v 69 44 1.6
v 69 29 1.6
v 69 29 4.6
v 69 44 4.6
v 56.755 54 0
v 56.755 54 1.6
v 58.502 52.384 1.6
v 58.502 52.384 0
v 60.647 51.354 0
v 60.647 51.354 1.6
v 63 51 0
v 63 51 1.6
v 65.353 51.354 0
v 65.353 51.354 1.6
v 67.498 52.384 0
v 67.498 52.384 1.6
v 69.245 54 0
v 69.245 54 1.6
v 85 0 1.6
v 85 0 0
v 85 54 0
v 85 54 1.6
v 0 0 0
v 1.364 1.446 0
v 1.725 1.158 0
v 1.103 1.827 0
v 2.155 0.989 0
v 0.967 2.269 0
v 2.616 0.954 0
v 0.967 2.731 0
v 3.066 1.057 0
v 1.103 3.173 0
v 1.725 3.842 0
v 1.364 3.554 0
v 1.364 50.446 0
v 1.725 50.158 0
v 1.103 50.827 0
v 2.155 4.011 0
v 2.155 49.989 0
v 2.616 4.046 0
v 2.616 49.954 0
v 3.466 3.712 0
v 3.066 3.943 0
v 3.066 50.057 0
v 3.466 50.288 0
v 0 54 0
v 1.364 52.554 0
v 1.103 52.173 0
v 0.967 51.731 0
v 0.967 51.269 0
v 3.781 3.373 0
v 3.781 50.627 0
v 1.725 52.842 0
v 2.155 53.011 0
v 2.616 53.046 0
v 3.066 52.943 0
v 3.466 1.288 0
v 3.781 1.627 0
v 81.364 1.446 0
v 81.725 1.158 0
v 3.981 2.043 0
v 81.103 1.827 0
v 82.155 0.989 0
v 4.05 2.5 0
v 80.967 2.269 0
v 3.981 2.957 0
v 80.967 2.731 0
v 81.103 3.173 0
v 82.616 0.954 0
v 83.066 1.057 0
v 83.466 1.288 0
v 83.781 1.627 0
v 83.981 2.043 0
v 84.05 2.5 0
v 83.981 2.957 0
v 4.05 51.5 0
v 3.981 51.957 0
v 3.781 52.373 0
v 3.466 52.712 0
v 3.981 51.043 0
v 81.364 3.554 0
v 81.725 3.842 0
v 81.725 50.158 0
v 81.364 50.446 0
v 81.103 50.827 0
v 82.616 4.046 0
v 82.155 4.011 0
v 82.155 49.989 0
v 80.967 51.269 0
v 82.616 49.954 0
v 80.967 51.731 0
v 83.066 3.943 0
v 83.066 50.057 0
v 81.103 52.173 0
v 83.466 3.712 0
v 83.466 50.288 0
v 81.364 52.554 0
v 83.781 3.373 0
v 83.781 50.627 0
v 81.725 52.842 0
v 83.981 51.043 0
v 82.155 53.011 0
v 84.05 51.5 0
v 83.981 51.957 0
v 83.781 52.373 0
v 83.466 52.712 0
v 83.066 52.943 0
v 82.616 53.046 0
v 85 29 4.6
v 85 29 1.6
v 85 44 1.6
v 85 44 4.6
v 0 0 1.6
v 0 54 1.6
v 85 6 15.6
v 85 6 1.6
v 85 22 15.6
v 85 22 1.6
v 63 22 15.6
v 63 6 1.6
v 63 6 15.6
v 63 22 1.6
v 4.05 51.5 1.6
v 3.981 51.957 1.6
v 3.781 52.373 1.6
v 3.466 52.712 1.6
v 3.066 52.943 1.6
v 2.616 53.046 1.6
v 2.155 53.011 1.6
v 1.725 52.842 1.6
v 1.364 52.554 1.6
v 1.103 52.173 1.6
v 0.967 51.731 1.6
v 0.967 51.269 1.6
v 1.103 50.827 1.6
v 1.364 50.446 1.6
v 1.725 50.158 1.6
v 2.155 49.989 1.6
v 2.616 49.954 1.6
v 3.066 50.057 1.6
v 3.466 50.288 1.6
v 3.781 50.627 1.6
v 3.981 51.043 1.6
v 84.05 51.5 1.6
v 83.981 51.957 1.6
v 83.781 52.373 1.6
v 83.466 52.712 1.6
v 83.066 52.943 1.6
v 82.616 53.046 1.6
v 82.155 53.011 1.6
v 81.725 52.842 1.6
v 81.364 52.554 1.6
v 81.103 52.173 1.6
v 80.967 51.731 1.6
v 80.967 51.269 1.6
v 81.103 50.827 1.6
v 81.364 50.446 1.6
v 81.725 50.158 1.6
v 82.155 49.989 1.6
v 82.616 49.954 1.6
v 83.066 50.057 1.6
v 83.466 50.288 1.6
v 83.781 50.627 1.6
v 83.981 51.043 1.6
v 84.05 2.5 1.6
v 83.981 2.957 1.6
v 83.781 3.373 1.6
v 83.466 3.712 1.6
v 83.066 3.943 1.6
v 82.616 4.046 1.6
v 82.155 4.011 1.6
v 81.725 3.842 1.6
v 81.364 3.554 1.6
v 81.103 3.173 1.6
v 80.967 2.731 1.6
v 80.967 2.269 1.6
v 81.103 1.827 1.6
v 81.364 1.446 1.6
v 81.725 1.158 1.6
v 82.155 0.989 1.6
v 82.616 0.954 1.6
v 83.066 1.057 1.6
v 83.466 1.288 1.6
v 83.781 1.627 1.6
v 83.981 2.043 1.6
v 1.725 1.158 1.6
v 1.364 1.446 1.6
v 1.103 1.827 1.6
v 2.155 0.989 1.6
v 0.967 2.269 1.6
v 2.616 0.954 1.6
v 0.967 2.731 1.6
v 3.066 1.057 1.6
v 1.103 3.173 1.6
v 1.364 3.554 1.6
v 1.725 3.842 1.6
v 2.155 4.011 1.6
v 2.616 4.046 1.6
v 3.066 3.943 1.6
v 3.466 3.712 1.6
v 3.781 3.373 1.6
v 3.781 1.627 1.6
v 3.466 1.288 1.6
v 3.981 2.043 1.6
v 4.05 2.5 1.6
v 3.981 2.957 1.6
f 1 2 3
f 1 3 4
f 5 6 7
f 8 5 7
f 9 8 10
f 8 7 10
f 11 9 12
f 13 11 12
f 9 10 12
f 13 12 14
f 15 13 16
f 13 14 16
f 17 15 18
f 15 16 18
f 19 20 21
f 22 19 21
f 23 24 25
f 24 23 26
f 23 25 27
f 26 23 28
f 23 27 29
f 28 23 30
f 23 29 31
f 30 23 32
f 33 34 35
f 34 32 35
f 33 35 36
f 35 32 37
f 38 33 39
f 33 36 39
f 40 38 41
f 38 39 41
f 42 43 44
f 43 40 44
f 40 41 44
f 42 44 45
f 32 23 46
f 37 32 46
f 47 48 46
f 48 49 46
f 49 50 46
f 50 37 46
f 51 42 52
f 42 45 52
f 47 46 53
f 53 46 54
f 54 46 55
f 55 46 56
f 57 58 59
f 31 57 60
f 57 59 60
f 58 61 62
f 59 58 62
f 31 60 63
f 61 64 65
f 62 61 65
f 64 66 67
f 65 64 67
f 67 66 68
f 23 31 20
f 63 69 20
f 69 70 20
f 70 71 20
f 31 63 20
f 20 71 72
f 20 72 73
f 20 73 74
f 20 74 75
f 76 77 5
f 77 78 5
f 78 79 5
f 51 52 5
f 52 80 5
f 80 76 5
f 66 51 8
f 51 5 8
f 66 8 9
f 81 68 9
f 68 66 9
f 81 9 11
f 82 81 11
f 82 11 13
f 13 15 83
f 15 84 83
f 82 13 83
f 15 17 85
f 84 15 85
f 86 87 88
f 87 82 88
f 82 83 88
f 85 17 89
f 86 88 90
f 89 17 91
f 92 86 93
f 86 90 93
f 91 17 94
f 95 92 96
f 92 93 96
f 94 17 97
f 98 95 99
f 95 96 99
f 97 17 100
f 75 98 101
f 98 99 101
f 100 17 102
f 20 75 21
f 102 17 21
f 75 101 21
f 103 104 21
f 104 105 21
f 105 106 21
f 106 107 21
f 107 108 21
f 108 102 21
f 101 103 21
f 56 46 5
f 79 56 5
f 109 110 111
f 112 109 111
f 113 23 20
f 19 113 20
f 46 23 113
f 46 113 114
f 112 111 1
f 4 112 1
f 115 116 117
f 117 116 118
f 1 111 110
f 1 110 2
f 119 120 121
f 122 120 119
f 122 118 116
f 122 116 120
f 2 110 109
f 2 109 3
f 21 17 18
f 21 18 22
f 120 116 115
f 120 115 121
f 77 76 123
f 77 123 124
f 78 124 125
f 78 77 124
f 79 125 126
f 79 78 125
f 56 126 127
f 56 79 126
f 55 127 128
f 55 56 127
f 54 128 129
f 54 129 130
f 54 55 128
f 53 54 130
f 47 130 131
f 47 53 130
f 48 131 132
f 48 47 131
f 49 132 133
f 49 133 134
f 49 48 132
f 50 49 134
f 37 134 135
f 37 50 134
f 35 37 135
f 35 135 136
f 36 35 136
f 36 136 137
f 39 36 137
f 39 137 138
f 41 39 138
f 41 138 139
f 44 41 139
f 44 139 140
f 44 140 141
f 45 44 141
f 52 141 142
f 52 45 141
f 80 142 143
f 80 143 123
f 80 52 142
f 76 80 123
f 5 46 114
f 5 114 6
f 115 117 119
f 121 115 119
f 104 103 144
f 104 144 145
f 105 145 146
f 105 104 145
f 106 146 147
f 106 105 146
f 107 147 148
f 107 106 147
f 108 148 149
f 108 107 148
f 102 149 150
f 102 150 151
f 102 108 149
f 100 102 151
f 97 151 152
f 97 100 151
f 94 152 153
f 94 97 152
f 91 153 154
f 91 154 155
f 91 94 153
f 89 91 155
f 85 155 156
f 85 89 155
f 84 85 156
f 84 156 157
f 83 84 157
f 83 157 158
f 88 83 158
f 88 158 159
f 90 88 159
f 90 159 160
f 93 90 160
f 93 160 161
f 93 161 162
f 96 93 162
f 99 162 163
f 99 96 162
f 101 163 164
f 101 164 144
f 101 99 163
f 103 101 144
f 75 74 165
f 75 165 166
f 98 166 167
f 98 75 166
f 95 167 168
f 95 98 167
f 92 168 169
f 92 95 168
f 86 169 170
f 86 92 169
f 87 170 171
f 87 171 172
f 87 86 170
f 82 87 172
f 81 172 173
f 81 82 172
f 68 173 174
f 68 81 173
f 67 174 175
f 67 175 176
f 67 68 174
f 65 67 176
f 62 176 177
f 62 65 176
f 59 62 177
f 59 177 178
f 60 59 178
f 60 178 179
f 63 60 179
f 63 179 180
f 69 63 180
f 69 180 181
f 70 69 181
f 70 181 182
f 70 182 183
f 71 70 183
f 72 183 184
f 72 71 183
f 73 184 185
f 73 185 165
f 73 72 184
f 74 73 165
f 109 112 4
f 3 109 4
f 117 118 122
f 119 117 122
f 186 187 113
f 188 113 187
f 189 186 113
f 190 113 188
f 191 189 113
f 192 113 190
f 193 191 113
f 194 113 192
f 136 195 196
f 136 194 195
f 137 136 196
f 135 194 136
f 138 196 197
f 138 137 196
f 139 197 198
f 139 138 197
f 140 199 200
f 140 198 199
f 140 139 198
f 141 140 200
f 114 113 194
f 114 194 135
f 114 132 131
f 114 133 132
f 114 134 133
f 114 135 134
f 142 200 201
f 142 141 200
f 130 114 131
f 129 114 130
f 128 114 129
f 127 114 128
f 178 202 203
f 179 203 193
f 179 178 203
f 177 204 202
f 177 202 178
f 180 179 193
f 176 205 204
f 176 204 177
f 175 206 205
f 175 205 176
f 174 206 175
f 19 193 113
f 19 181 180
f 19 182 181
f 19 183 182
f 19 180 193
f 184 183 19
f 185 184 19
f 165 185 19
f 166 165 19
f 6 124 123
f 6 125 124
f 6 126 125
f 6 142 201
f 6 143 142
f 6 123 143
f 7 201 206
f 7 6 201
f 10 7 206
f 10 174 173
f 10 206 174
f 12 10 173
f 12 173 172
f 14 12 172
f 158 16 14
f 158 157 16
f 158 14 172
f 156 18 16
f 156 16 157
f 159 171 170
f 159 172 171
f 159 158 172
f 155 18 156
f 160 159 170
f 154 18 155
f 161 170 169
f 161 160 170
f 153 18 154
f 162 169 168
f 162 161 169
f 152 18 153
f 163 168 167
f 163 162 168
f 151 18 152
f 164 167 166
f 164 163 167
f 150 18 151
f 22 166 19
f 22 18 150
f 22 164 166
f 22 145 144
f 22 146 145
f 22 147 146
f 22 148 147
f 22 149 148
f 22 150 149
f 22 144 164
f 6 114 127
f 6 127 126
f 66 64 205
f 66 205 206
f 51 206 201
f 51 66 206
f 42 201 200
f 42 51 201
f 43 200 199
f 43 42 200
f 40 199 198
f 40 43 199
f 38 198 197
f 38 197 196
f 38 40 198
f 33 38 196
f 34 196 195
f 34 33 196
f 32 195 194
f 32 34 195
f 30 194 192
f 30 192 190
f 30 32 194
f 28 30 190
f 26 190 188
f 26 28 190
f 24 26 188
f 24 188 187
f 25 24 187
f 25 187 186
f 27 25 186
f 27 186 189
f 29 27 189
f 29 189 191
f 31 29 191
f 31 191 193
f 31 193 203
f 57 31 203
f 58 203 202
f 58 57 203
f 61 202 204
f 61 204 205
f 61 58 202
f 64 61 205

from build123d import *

# Parameters (mm, degrees)
SKETCH_1_W          = 85
SKETCH_1_H          = 54
SKETCH_1_R          = 1.55
EXTRUDE_1_DEPTH     = 1.6
SKETCH_2_W          = 22
SKETCH_2_H          = 16
EXTRUDE_2_DEPTH     = 14
SKETCH_2_3_W        = 16
SKETCH_2_3_H        = 15
EXTRUDE_3_DEPTH     = 3
CUT_EXTRUDE_1_DEPTH = 2.6


with BuildPart() as part:
    # Sketch 1 → Extrude 1 (new body)
    with BuildSketch(Plane.XY):
        with Locations((42.5, 27)):
            Rectangle(SKETCH_1_W, SKETCH_1_H)
        with Locations((2.5, 51.5)):
            Circle(SKETCH_1_R, mode=Mode.SUBTRACT)
        with Locations((82.5, 51.5)):
            Circle(SKETCH_1_R, mode=Mode.SUBTRACT)
        with Locations((82.5, 2.5)):
            Circle(SKETCH_1_R, mode=Mode.SUBTRACT)
        with Locations((2.5, 2.5)):
            Circle(SKETCH_1_R, mode=Mode.SUBTRACT)
    extrude(amount=EXTRUDE_1_DEPTH)

    # Sketch 5 → Cut-Extrude 1 (cut, through all)
    with BuildSketch(Plane.XY.offset(1.6)):
        with BuildLine():
            Line((-59.259445708, 198.901998746), (56.755002002, 54))
            ThreePointArc((56.755002002, 54), (63, 51), (69.244997998, 54))
            Line((69.244997998, 54), (185.259445708, 198.901998746))
            Line((185.259445708, 198.901998746), (185.259445708, 570.148231416))
            Line((185.259445708, 570.148231416), (-59.259445708, 570.148231416))
            Line((-59.259445708, 570.148231416), (-59.259445708, 198.901998746))
        make_face()
    extrude(amount=-CUT_EXTRUDE_1_DEPTH, mode=Mode.SUBTRACT)


with BuildPart() as body_2:
    # Sketch 2 → Extrude 2 (new body)
    with BuildSketch(Plane(origin=(0, 0, 1.6), x_dir=(-1, 0, 0), z_dir=(0, 0, -1))):
        with Locations((-74, 14)):
            Rectangle(SKETCH_2_W, SKETCH_2_H)
    extrude(amount=-EXTRUDE_2_DEPTH)


with BuildPart() as body_3:
    # Sketch 2_3 → Extrude 3 (new body)
    with BuildSketch(Plane(origin=(0, 0, 1.6), x_dir=(-1, 0, 0), z_dir=(0, 0, -1))):
        with Locations((-77, 36.5)):
            Rectangle(SKETCH_2_3_W, SKETCH_2_3_H)
    extrude(amount=-EXTRUDE_3_DEPTH)


solid = Compound([part.part, body_2.part, body_3.part])
